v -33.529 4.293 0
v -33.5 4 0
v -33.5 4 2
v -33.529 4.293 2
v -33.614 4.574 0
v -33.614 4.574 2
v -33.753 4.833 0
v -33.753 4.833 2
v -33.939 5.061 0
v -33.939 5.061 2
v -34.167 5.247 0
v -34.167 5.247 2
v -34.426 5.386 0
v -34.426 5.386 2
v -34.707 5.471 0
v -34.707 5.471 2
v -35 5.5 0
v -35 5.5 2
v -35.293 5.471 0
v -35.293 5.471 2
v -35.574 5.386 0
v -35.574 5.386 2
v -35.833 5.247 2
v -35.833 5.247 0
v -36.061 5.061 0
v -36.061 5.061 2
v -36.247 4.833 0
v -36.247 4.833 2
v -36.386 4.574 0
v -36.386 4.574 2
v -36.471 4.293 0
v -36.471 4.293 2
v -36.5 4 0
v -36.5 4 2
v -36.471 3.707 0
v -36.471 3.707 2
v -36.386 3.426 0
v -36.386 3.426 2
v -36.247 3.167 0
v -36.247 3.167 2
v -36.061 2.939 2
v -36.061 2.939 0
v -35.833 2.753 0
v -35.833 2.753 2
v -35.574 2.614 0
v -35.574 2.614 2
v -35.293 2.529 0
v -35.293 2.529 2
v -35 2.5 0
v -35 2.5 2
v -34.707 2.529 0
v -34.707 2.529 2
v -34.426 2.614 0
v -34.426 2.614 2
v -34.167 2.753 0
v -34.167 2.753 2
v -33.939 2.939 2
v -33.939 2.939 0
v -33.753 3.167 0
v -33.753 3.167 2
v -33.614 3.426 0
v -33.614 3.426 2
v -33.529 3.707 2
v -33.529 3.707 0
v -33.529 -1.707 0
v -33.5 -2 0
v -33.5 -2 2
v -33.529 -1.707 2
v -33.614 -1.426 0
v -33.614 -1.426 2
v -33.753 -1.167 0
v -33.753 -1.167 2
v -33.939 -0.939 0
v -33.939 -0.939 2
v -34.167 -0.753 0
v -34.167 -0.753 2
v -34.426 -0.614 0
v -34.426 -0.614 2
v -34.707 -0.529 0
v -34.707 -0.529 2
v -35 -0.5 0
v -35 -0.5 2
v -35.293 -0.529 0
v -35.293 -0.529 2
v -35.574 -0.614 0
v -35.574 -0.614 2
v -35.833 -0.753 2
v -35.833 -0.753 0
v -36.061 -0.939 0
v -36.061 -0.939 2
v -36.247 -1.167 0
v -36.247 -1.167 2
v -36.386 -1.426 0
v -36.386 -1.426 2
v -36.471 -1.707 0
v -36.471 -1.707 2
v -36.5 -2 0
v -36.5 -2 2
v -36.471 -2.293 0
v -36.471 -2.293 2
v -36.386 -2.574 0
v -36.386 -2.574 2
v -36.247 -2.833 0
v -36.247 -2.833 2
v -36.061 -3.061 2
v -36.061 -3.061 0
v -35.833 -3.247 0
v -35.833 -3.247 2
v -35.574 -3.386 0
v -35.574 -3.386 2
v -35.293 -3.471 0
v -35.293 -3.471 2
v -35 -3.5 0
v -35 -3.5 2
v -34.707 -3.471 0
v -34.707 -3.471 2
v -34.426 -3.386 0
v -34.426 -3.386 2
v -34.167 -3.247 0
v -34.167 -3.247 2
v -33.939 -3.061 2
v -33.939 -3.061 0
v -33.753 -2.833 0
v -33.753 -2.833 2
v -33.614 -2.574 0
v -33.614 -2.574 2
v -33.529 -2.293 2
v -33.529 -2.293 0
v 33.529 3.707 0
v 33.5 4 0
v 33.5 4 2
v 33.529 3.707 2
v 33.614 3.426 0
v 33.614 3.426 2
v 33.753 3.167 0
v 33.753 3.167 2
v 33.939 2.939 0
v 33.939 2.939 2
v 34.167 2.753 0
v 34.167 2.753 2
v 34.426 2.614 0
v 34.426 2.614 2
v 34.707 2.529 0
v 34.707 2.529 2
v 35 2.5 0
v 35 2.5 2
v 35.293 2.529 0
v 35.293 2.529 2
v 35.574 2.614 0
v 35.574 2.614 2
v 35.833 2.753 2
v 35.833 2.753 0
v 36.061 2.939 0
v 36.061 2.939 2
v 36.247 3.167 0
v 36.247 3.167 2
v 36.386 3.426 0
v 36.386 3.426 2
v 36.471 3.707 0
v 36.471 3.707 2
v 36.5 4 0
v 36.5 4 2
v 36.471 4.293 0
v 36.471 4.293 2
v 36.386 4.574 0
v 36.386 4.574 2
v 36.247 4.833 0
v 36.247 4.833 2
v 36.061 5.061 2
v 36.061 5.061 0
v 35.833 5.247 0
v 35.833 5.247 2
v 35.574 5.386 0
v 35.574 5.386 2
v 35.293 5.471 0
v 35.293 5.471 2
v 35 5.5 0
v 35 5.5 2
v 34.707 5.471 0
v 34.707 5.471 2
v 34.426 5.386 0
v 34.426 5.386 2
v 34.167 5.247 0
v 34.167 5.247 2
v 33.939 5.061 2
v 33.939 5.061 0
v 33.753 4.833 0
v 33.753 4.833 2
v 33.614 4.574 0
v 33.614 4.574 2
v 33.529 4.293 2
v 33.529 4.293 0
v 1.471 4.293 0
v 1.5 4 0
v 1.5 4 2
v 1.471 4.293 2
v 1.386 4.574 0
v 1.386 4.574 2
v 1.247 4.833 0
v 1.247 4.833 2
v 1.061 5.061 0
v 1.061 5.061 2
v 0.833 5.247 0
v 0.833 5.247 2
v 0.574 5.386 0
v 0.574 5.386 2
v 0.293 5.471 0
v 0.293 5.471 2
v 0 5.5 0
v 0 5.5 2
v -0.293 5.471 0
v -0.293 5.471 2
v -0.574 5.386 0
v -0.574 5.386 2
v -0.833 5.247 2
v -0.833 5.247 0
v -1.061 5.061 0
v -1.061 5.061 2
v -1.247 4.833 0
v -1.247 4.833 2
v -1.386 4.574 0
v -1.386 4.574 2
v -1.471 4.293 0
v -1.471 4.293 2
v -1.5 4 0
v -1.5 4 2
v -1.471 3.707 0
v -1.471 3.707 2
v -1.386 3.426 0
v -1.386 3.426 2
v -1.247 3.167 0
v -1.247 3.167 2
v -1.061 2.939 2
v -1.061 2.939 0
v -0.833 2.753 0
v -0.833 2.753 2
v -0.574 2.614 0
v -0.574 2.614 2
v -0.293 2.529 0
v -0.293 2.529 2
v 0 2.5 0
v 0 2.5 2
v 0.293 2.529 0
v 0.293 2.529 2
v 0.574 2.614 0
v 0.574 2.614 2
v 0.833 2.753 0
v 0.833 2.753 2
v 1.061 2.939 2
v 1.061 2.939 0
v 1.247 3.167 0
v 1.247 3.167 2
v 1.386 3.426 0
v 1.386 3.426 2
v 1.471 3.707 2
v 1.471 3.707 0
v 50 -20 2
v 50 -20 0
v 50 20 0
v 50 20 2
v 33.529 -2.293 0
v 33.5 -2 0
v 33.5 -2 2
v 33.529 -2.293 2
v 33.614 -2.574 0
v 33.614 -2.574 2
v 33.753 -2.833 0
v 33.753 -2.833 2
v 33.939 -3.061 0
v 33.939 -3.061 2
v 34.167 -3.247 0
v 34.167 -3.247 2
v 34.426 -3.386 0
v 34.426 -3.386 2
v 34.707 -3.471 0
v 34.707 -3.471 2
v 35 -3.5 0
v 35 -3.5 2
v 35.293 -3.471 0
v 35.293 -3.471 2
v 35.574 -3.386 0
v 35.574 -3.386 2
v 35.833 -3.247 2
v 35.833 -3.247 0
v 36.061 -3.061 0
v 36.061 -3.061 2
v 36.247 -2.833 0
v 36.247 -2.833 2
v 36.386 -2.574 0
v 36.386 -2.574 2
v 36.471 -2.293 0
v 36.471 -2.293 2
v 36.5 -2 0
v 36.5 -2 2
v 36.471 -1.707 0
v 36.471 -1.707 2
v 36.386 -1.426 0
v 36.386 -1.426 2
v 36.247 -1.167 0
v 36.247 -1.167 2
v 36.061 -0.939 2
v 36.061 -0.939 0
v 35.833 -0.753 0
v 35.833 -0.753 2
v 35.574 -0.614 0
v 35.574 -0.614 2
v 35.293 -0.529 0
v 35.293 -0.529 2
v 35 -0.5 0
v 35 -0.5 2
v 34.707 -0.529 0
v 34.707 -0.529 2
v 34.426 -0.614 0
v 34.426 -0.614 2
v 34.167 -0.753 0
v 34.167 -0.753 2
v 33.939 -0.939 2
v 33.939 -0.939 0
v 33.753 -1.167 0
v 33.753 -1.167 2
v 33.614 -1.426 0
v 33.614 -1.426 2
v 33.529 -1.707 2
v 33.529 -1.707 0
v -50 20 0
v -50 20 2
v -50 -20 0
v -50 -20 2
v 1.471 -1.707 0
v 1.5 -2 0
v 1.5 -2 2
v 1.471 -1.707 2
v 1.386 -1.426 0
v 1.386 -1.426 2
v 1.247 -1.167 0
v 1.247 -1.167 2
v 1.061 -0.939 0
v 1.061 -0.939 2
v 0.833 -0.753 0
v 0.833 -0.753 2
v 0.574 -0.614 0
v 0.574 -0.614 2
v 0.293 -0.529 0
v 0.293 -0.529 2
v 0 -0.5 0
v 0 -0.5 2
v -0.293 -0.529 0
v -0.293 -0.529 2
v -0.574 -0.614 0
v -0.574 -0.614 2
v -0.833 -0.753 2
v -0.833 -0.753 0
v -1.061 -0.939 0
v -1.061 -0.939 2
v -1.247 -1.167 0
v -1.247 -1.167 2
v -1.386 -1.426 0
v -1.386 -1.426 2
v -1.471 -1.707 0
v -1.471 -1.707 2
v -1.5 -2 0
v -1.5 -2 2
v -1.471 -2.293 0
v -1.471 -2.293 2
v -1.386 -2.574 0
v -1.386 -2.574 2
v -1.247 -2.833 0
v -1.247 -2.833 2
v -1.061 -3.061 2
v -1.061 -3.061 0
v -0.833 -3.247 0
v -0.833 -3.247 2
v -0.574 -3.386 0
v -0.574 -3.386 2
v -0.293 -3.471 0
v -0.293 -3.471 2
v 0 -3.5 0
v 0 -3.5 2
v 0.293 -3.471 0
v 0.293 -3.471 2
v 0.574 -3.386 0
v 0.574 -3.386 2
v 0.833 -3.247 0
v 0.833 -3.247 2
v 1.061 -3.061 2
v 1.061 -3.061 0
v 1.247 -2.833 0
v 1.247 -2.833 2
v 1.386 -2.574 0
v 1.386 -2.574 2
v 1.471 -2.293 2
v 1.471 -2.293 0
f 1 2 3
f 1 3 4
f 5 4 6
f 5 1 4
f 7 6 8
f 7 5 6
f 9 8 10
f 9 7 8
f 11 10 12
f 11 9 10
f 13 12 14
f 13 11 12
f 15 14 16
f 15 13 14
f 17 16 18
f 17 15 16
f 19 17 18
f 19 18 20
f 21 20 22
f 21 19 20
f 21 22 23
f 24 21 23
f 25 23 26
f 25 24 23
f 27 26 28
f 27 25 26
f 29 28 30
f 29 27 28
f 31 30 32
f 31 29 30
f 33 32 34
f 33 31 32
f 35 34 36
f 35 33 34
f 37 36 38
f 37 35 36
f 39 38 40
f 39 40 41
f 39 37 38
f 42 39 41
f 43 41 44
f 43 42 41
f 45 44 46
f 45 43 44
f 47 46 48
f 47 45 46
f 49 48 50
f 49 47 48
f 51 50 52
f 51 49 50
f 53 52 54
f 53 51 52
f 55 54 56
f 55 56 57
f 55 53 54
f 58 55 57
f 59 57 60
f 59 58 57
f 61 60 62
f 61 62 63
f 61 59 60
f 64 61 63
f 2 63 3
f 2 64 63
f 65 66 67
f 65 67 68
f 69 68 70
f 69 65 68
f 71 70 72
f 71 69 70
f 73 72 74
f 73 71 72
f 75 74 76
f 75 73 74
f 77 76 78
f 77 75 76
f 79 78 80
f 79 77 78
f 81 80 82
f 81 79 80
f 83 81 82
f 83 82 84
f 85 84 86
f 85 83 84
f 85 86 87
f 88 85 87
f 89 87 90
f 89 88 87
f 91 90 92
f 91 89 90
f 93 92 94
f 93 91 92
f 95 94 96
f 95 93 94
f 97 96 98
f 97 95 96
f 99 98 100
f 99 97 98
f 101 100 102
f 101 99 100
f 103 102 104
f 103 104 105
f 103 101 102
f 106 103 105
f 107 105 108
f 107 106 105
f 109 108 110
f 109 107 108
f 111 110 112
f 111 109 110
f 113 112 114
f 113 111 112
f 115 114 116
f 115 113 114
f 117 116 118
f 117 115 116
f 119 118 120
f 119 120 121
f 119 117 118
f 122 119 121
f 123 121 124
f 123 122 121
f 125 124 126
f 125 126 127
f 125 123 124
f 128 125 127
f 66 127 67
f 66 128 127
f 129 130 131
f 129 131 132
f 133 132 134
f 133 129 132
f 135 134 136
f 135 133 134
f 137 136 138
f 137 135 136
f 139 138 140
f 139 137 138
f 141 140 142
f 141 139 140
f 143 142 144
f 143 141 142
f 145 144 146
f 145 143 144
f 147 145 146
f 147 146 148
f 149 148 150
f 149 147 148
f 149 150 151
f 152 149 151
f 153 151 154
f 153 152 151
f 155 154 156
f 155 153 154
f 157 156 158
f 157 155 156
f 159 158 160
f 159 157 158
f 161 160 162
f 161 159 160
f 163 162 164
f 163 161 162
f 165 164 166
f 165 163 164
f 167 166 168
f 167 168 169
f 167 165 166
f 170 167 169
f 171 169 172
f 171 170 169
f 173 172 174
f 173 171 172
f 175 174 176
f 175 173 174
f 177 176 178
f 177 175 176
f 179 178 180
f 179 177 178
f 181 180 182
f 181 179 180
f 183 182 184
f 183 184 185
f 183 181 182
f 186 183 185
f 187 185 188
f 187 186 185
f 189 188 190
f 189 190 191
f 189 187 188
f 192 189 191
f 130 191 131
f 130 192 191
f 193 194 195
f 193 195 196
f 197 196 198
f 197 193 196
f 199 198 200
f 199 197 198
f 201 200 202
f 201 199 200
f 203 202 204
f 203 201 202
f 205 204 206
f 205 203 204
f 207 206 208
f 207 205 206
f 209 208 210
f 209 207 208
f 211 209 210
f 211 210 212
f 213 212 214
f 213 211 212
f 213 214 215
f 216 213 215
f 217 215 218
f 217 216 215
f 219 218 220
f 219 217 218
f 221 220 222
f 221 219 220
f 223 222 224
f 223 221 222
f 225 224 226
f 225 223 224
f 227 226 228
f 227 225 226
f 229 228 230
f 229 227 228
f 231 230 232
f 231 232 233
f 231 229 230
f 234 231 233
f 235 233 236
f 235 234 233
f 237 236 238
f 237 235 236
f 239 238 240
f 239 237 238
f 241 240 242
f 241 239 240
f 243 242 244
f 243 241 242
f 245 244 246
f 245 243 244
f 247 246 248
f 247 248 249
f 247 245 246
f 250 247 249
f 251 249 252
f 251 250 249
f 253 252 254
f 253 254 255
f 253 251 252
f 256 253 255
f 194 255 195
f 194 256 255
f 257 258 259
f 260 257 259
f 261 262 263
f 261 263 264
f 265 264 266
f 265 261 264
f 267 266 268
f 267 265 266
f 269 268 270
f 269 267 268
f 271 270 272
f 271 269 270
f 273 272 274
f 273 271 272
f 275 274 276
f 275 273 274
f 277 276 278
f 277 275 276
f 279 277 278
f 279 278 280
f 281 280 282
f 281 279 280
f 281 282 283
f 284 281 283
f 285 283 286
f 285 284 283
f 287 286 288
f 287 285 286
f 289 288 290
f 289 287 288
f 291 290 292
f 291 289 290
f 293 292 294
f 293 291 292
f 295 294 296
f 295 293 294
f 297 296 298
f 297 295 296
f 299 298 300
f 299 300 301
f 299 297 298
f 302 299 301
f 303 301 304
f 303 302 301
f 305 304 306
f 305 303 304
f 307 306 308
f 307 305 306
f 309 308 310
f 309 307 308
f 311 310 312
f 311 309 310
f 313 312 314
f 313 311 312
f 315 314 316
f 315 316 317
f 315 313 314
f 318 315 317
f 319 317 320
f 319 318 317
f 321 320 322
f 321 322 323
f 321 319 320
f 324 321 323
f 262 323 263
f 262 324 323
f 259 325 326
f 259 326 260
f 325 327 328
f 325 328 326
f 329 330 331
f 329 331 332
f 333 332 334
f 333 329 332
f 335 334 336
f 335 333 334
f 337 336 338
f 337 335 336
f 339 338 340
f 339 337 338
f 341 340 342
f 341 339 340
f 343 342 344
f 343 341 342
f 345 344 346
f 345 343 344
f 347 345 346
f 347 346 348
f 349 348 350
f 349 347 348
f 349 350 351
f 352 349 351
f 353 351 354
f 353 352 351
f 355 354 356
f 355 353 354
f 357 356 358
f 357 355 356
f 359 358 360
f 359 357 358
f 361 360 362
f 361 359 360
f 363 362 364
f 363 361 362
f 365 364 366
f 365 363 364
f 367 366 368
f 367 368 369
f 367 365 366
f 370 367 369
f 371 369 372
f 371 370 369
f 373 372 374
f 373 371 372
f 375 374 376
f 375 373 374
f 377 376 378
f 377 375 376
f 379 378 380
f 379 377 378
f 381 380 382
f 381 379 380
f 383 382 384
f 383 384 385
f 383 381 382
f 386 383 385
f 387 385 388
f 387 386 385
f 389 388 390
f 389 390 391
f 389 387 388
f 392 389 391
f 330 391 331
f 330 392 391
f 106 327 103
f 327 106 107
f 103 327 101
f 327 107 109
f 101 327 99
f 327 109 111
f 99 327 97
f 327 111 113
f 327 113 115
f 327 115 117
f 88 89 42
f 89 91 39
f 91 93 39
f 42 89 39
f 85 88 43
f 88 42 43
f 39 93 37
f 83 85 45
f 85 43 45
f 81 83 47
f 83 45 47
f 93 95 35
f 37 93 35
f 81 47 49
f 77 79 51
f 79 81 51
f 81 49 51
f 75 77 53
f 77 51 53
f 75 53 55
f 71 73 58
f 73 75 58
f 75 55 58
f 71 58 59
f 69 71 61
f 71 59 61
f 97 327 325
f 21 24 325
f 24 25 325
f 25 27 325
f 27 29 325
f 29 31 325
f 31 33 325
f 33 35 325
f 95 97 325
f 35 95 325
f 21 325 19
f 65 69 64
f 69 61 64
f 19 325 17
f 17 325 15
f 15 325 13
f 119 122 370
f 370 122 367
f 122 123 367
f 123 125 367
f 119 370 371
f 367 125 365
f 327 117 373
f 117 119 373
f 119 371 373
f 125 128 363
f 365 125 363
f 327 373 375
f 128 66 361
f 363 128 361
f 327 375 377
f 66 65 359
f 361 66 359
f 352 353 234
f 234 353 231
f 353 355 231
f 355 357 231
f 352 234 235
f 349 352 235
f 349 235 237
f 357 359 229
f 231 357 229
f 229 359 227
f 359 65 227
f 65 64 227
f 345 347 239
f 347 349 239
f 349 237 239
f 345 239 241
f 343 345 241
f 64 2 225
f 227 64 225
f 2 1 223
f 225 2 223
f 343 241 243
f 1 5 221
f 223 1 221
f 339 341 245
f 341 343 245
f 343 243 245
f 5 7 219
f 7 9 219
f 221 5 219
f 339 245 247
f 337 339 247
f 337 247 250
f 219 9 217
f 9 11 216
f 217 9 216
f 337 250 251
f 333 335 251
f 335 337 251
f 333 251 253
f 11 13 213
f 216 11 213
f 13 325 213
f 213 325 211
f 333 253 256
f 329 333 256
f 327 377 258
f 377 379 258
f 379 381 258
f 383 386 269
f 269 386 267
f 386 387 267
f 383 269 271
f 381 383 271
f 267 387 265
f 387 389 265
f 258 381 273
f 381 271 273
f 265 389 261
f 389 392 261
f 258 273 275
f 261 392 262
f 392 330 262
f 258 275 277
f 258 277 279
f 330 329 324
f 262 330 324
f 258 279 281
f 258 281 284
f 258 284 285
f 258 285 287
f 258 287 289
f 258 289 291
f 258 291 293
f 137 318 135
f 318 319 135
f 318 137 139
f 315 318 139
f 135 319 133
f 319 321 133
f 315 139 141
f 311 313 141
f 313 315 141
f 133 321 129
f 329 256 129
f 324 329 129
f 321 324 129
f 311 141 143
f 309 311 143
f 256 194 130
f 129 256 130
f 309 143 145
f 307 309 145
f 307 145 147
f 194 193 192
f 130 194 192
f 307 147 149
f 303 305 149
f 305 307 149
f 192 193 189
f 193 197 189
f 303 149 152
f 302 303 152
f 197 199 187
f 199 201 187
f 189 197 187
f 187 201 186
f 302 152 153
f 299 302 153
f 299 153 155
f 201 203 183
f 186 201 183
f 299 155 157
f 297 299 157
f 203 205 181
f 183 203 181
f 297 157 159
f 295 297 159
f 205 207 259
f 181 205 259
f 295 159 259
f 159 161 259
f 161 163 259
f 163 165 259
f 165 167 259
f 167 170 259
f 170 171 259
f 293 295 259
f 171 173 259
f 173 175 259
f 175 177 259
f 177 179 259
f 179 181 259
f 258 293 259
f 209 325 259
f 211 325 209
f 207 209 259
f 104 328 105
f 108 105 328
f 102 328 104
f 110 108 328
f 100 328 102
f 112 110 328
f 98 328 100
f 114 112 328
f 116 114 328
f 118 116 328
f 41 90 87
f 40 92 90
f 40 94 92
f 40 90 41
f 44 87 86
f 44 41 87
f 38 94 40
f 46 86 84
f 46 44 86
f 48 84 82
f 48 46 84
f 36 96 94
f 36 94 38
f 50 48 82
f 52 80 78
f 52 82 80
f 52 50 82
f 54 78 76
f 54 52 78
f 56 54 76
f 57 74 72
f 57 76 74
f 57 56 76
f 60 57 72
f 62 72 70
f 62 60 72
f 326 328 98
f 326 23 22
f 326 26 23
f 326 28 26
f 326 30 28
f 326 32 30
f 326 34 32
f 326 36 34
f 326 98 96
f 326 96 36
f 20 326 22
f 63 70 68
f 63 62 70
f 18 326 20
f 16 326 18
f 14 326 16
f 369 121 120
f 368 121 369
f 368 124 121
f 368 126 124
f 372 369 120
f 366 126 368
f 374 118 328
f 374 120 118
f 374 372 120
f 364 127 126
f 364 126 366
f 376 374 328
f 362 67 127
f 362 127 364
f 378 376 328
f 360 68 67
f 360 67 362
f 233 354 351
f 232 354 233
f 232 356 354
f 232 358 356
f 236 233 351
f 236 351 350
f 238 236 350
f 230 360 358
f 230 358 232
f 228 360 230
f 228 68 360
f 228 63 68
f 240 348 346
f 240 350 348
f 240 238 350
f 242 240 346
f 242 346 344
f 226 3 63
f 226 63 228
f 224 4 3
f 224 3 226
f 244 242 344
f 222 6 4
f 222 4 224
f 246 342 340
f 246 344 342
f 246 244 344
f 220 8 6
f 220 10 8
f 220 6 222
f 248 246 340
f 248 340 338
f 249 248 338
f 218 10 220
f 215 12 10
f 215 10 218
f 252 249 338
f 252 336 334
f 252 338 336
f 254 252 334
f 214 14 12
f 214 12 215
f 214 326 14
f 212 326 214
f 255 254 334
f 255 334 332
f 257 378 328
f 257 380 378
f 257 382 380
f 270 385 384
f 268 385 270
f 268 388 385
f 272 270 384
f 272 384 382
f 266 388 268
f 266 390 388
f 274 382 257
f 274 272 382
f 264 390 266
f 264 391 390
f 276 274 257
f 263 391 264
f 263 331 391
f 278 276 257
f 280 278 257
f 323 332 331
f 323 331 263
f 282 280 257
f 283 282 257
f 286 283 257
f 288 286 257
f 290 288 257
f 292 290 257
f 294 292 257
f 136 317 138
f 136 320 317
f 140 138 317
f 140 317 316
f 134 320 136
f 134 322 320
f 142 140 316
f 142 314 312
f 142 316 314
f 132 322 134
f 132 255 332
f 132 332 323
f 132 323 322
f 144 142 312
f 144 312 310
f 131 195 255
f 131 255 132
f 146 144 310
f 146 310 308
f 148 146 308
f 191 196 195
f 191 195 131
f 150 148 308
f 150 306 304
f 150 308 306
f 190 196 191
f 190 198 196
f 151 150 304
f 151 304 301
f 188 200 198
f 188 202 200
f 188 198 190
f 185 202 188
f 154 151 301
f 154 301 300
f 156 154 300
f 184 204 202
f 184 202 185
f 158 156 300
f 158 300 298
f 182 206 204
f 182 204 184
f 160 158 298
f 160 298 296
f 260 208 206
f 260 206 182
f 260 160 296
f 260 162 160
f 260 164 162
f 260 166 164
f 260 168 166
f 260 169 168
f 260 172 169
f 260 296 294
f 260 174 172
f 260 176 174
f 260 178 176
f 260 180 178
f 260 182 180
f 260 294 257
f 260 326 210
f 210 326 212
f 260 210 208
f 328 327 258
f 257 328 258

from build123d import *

# Parameters (mm, degrees)
SKETCH1_W           = 100
SKETCH1_H           = 40
SKETCH1_R           = 1.5
BOSS_EXTRUDE1_DEPTH = 2


with BuildPart() as part:
    # Sketch1 → Boss-Extrude1 (new body)
    with BuildSketch(Plane.XY):
        Rectangle(SKETCH1_W, SKETCH1_H)
        with Locations((-35, -2)):
            Circle(SKETCH1_R, mode=Mode.SUBTRACT)
        with Locations(Location((35, 4, 0), (0, 0, 180))):
            Circle(SKETCH1_R, mode=Mode.SUBTRACT)
        with Locations((0, 4)):
            Circle(SKETCH1_R, mode=Mode.SUBTRACT)
        with Locations((-35, 4)):
            Circle(SKETCH1_R, mode=Mode.SUBTRACT)
        with Locations(Location((35, -2, 0), (0, 0, 180))):
            Circle(SKETCH1_R, mode=Mode.SUBTRACT)
        with Locations((0, -2)):
            Circle(SKETCH1_R, mode=Mode.SUBTRACT)
    extrude(amount=BOSS_EXTRUDE1_DEPTH)


solid = part.part
